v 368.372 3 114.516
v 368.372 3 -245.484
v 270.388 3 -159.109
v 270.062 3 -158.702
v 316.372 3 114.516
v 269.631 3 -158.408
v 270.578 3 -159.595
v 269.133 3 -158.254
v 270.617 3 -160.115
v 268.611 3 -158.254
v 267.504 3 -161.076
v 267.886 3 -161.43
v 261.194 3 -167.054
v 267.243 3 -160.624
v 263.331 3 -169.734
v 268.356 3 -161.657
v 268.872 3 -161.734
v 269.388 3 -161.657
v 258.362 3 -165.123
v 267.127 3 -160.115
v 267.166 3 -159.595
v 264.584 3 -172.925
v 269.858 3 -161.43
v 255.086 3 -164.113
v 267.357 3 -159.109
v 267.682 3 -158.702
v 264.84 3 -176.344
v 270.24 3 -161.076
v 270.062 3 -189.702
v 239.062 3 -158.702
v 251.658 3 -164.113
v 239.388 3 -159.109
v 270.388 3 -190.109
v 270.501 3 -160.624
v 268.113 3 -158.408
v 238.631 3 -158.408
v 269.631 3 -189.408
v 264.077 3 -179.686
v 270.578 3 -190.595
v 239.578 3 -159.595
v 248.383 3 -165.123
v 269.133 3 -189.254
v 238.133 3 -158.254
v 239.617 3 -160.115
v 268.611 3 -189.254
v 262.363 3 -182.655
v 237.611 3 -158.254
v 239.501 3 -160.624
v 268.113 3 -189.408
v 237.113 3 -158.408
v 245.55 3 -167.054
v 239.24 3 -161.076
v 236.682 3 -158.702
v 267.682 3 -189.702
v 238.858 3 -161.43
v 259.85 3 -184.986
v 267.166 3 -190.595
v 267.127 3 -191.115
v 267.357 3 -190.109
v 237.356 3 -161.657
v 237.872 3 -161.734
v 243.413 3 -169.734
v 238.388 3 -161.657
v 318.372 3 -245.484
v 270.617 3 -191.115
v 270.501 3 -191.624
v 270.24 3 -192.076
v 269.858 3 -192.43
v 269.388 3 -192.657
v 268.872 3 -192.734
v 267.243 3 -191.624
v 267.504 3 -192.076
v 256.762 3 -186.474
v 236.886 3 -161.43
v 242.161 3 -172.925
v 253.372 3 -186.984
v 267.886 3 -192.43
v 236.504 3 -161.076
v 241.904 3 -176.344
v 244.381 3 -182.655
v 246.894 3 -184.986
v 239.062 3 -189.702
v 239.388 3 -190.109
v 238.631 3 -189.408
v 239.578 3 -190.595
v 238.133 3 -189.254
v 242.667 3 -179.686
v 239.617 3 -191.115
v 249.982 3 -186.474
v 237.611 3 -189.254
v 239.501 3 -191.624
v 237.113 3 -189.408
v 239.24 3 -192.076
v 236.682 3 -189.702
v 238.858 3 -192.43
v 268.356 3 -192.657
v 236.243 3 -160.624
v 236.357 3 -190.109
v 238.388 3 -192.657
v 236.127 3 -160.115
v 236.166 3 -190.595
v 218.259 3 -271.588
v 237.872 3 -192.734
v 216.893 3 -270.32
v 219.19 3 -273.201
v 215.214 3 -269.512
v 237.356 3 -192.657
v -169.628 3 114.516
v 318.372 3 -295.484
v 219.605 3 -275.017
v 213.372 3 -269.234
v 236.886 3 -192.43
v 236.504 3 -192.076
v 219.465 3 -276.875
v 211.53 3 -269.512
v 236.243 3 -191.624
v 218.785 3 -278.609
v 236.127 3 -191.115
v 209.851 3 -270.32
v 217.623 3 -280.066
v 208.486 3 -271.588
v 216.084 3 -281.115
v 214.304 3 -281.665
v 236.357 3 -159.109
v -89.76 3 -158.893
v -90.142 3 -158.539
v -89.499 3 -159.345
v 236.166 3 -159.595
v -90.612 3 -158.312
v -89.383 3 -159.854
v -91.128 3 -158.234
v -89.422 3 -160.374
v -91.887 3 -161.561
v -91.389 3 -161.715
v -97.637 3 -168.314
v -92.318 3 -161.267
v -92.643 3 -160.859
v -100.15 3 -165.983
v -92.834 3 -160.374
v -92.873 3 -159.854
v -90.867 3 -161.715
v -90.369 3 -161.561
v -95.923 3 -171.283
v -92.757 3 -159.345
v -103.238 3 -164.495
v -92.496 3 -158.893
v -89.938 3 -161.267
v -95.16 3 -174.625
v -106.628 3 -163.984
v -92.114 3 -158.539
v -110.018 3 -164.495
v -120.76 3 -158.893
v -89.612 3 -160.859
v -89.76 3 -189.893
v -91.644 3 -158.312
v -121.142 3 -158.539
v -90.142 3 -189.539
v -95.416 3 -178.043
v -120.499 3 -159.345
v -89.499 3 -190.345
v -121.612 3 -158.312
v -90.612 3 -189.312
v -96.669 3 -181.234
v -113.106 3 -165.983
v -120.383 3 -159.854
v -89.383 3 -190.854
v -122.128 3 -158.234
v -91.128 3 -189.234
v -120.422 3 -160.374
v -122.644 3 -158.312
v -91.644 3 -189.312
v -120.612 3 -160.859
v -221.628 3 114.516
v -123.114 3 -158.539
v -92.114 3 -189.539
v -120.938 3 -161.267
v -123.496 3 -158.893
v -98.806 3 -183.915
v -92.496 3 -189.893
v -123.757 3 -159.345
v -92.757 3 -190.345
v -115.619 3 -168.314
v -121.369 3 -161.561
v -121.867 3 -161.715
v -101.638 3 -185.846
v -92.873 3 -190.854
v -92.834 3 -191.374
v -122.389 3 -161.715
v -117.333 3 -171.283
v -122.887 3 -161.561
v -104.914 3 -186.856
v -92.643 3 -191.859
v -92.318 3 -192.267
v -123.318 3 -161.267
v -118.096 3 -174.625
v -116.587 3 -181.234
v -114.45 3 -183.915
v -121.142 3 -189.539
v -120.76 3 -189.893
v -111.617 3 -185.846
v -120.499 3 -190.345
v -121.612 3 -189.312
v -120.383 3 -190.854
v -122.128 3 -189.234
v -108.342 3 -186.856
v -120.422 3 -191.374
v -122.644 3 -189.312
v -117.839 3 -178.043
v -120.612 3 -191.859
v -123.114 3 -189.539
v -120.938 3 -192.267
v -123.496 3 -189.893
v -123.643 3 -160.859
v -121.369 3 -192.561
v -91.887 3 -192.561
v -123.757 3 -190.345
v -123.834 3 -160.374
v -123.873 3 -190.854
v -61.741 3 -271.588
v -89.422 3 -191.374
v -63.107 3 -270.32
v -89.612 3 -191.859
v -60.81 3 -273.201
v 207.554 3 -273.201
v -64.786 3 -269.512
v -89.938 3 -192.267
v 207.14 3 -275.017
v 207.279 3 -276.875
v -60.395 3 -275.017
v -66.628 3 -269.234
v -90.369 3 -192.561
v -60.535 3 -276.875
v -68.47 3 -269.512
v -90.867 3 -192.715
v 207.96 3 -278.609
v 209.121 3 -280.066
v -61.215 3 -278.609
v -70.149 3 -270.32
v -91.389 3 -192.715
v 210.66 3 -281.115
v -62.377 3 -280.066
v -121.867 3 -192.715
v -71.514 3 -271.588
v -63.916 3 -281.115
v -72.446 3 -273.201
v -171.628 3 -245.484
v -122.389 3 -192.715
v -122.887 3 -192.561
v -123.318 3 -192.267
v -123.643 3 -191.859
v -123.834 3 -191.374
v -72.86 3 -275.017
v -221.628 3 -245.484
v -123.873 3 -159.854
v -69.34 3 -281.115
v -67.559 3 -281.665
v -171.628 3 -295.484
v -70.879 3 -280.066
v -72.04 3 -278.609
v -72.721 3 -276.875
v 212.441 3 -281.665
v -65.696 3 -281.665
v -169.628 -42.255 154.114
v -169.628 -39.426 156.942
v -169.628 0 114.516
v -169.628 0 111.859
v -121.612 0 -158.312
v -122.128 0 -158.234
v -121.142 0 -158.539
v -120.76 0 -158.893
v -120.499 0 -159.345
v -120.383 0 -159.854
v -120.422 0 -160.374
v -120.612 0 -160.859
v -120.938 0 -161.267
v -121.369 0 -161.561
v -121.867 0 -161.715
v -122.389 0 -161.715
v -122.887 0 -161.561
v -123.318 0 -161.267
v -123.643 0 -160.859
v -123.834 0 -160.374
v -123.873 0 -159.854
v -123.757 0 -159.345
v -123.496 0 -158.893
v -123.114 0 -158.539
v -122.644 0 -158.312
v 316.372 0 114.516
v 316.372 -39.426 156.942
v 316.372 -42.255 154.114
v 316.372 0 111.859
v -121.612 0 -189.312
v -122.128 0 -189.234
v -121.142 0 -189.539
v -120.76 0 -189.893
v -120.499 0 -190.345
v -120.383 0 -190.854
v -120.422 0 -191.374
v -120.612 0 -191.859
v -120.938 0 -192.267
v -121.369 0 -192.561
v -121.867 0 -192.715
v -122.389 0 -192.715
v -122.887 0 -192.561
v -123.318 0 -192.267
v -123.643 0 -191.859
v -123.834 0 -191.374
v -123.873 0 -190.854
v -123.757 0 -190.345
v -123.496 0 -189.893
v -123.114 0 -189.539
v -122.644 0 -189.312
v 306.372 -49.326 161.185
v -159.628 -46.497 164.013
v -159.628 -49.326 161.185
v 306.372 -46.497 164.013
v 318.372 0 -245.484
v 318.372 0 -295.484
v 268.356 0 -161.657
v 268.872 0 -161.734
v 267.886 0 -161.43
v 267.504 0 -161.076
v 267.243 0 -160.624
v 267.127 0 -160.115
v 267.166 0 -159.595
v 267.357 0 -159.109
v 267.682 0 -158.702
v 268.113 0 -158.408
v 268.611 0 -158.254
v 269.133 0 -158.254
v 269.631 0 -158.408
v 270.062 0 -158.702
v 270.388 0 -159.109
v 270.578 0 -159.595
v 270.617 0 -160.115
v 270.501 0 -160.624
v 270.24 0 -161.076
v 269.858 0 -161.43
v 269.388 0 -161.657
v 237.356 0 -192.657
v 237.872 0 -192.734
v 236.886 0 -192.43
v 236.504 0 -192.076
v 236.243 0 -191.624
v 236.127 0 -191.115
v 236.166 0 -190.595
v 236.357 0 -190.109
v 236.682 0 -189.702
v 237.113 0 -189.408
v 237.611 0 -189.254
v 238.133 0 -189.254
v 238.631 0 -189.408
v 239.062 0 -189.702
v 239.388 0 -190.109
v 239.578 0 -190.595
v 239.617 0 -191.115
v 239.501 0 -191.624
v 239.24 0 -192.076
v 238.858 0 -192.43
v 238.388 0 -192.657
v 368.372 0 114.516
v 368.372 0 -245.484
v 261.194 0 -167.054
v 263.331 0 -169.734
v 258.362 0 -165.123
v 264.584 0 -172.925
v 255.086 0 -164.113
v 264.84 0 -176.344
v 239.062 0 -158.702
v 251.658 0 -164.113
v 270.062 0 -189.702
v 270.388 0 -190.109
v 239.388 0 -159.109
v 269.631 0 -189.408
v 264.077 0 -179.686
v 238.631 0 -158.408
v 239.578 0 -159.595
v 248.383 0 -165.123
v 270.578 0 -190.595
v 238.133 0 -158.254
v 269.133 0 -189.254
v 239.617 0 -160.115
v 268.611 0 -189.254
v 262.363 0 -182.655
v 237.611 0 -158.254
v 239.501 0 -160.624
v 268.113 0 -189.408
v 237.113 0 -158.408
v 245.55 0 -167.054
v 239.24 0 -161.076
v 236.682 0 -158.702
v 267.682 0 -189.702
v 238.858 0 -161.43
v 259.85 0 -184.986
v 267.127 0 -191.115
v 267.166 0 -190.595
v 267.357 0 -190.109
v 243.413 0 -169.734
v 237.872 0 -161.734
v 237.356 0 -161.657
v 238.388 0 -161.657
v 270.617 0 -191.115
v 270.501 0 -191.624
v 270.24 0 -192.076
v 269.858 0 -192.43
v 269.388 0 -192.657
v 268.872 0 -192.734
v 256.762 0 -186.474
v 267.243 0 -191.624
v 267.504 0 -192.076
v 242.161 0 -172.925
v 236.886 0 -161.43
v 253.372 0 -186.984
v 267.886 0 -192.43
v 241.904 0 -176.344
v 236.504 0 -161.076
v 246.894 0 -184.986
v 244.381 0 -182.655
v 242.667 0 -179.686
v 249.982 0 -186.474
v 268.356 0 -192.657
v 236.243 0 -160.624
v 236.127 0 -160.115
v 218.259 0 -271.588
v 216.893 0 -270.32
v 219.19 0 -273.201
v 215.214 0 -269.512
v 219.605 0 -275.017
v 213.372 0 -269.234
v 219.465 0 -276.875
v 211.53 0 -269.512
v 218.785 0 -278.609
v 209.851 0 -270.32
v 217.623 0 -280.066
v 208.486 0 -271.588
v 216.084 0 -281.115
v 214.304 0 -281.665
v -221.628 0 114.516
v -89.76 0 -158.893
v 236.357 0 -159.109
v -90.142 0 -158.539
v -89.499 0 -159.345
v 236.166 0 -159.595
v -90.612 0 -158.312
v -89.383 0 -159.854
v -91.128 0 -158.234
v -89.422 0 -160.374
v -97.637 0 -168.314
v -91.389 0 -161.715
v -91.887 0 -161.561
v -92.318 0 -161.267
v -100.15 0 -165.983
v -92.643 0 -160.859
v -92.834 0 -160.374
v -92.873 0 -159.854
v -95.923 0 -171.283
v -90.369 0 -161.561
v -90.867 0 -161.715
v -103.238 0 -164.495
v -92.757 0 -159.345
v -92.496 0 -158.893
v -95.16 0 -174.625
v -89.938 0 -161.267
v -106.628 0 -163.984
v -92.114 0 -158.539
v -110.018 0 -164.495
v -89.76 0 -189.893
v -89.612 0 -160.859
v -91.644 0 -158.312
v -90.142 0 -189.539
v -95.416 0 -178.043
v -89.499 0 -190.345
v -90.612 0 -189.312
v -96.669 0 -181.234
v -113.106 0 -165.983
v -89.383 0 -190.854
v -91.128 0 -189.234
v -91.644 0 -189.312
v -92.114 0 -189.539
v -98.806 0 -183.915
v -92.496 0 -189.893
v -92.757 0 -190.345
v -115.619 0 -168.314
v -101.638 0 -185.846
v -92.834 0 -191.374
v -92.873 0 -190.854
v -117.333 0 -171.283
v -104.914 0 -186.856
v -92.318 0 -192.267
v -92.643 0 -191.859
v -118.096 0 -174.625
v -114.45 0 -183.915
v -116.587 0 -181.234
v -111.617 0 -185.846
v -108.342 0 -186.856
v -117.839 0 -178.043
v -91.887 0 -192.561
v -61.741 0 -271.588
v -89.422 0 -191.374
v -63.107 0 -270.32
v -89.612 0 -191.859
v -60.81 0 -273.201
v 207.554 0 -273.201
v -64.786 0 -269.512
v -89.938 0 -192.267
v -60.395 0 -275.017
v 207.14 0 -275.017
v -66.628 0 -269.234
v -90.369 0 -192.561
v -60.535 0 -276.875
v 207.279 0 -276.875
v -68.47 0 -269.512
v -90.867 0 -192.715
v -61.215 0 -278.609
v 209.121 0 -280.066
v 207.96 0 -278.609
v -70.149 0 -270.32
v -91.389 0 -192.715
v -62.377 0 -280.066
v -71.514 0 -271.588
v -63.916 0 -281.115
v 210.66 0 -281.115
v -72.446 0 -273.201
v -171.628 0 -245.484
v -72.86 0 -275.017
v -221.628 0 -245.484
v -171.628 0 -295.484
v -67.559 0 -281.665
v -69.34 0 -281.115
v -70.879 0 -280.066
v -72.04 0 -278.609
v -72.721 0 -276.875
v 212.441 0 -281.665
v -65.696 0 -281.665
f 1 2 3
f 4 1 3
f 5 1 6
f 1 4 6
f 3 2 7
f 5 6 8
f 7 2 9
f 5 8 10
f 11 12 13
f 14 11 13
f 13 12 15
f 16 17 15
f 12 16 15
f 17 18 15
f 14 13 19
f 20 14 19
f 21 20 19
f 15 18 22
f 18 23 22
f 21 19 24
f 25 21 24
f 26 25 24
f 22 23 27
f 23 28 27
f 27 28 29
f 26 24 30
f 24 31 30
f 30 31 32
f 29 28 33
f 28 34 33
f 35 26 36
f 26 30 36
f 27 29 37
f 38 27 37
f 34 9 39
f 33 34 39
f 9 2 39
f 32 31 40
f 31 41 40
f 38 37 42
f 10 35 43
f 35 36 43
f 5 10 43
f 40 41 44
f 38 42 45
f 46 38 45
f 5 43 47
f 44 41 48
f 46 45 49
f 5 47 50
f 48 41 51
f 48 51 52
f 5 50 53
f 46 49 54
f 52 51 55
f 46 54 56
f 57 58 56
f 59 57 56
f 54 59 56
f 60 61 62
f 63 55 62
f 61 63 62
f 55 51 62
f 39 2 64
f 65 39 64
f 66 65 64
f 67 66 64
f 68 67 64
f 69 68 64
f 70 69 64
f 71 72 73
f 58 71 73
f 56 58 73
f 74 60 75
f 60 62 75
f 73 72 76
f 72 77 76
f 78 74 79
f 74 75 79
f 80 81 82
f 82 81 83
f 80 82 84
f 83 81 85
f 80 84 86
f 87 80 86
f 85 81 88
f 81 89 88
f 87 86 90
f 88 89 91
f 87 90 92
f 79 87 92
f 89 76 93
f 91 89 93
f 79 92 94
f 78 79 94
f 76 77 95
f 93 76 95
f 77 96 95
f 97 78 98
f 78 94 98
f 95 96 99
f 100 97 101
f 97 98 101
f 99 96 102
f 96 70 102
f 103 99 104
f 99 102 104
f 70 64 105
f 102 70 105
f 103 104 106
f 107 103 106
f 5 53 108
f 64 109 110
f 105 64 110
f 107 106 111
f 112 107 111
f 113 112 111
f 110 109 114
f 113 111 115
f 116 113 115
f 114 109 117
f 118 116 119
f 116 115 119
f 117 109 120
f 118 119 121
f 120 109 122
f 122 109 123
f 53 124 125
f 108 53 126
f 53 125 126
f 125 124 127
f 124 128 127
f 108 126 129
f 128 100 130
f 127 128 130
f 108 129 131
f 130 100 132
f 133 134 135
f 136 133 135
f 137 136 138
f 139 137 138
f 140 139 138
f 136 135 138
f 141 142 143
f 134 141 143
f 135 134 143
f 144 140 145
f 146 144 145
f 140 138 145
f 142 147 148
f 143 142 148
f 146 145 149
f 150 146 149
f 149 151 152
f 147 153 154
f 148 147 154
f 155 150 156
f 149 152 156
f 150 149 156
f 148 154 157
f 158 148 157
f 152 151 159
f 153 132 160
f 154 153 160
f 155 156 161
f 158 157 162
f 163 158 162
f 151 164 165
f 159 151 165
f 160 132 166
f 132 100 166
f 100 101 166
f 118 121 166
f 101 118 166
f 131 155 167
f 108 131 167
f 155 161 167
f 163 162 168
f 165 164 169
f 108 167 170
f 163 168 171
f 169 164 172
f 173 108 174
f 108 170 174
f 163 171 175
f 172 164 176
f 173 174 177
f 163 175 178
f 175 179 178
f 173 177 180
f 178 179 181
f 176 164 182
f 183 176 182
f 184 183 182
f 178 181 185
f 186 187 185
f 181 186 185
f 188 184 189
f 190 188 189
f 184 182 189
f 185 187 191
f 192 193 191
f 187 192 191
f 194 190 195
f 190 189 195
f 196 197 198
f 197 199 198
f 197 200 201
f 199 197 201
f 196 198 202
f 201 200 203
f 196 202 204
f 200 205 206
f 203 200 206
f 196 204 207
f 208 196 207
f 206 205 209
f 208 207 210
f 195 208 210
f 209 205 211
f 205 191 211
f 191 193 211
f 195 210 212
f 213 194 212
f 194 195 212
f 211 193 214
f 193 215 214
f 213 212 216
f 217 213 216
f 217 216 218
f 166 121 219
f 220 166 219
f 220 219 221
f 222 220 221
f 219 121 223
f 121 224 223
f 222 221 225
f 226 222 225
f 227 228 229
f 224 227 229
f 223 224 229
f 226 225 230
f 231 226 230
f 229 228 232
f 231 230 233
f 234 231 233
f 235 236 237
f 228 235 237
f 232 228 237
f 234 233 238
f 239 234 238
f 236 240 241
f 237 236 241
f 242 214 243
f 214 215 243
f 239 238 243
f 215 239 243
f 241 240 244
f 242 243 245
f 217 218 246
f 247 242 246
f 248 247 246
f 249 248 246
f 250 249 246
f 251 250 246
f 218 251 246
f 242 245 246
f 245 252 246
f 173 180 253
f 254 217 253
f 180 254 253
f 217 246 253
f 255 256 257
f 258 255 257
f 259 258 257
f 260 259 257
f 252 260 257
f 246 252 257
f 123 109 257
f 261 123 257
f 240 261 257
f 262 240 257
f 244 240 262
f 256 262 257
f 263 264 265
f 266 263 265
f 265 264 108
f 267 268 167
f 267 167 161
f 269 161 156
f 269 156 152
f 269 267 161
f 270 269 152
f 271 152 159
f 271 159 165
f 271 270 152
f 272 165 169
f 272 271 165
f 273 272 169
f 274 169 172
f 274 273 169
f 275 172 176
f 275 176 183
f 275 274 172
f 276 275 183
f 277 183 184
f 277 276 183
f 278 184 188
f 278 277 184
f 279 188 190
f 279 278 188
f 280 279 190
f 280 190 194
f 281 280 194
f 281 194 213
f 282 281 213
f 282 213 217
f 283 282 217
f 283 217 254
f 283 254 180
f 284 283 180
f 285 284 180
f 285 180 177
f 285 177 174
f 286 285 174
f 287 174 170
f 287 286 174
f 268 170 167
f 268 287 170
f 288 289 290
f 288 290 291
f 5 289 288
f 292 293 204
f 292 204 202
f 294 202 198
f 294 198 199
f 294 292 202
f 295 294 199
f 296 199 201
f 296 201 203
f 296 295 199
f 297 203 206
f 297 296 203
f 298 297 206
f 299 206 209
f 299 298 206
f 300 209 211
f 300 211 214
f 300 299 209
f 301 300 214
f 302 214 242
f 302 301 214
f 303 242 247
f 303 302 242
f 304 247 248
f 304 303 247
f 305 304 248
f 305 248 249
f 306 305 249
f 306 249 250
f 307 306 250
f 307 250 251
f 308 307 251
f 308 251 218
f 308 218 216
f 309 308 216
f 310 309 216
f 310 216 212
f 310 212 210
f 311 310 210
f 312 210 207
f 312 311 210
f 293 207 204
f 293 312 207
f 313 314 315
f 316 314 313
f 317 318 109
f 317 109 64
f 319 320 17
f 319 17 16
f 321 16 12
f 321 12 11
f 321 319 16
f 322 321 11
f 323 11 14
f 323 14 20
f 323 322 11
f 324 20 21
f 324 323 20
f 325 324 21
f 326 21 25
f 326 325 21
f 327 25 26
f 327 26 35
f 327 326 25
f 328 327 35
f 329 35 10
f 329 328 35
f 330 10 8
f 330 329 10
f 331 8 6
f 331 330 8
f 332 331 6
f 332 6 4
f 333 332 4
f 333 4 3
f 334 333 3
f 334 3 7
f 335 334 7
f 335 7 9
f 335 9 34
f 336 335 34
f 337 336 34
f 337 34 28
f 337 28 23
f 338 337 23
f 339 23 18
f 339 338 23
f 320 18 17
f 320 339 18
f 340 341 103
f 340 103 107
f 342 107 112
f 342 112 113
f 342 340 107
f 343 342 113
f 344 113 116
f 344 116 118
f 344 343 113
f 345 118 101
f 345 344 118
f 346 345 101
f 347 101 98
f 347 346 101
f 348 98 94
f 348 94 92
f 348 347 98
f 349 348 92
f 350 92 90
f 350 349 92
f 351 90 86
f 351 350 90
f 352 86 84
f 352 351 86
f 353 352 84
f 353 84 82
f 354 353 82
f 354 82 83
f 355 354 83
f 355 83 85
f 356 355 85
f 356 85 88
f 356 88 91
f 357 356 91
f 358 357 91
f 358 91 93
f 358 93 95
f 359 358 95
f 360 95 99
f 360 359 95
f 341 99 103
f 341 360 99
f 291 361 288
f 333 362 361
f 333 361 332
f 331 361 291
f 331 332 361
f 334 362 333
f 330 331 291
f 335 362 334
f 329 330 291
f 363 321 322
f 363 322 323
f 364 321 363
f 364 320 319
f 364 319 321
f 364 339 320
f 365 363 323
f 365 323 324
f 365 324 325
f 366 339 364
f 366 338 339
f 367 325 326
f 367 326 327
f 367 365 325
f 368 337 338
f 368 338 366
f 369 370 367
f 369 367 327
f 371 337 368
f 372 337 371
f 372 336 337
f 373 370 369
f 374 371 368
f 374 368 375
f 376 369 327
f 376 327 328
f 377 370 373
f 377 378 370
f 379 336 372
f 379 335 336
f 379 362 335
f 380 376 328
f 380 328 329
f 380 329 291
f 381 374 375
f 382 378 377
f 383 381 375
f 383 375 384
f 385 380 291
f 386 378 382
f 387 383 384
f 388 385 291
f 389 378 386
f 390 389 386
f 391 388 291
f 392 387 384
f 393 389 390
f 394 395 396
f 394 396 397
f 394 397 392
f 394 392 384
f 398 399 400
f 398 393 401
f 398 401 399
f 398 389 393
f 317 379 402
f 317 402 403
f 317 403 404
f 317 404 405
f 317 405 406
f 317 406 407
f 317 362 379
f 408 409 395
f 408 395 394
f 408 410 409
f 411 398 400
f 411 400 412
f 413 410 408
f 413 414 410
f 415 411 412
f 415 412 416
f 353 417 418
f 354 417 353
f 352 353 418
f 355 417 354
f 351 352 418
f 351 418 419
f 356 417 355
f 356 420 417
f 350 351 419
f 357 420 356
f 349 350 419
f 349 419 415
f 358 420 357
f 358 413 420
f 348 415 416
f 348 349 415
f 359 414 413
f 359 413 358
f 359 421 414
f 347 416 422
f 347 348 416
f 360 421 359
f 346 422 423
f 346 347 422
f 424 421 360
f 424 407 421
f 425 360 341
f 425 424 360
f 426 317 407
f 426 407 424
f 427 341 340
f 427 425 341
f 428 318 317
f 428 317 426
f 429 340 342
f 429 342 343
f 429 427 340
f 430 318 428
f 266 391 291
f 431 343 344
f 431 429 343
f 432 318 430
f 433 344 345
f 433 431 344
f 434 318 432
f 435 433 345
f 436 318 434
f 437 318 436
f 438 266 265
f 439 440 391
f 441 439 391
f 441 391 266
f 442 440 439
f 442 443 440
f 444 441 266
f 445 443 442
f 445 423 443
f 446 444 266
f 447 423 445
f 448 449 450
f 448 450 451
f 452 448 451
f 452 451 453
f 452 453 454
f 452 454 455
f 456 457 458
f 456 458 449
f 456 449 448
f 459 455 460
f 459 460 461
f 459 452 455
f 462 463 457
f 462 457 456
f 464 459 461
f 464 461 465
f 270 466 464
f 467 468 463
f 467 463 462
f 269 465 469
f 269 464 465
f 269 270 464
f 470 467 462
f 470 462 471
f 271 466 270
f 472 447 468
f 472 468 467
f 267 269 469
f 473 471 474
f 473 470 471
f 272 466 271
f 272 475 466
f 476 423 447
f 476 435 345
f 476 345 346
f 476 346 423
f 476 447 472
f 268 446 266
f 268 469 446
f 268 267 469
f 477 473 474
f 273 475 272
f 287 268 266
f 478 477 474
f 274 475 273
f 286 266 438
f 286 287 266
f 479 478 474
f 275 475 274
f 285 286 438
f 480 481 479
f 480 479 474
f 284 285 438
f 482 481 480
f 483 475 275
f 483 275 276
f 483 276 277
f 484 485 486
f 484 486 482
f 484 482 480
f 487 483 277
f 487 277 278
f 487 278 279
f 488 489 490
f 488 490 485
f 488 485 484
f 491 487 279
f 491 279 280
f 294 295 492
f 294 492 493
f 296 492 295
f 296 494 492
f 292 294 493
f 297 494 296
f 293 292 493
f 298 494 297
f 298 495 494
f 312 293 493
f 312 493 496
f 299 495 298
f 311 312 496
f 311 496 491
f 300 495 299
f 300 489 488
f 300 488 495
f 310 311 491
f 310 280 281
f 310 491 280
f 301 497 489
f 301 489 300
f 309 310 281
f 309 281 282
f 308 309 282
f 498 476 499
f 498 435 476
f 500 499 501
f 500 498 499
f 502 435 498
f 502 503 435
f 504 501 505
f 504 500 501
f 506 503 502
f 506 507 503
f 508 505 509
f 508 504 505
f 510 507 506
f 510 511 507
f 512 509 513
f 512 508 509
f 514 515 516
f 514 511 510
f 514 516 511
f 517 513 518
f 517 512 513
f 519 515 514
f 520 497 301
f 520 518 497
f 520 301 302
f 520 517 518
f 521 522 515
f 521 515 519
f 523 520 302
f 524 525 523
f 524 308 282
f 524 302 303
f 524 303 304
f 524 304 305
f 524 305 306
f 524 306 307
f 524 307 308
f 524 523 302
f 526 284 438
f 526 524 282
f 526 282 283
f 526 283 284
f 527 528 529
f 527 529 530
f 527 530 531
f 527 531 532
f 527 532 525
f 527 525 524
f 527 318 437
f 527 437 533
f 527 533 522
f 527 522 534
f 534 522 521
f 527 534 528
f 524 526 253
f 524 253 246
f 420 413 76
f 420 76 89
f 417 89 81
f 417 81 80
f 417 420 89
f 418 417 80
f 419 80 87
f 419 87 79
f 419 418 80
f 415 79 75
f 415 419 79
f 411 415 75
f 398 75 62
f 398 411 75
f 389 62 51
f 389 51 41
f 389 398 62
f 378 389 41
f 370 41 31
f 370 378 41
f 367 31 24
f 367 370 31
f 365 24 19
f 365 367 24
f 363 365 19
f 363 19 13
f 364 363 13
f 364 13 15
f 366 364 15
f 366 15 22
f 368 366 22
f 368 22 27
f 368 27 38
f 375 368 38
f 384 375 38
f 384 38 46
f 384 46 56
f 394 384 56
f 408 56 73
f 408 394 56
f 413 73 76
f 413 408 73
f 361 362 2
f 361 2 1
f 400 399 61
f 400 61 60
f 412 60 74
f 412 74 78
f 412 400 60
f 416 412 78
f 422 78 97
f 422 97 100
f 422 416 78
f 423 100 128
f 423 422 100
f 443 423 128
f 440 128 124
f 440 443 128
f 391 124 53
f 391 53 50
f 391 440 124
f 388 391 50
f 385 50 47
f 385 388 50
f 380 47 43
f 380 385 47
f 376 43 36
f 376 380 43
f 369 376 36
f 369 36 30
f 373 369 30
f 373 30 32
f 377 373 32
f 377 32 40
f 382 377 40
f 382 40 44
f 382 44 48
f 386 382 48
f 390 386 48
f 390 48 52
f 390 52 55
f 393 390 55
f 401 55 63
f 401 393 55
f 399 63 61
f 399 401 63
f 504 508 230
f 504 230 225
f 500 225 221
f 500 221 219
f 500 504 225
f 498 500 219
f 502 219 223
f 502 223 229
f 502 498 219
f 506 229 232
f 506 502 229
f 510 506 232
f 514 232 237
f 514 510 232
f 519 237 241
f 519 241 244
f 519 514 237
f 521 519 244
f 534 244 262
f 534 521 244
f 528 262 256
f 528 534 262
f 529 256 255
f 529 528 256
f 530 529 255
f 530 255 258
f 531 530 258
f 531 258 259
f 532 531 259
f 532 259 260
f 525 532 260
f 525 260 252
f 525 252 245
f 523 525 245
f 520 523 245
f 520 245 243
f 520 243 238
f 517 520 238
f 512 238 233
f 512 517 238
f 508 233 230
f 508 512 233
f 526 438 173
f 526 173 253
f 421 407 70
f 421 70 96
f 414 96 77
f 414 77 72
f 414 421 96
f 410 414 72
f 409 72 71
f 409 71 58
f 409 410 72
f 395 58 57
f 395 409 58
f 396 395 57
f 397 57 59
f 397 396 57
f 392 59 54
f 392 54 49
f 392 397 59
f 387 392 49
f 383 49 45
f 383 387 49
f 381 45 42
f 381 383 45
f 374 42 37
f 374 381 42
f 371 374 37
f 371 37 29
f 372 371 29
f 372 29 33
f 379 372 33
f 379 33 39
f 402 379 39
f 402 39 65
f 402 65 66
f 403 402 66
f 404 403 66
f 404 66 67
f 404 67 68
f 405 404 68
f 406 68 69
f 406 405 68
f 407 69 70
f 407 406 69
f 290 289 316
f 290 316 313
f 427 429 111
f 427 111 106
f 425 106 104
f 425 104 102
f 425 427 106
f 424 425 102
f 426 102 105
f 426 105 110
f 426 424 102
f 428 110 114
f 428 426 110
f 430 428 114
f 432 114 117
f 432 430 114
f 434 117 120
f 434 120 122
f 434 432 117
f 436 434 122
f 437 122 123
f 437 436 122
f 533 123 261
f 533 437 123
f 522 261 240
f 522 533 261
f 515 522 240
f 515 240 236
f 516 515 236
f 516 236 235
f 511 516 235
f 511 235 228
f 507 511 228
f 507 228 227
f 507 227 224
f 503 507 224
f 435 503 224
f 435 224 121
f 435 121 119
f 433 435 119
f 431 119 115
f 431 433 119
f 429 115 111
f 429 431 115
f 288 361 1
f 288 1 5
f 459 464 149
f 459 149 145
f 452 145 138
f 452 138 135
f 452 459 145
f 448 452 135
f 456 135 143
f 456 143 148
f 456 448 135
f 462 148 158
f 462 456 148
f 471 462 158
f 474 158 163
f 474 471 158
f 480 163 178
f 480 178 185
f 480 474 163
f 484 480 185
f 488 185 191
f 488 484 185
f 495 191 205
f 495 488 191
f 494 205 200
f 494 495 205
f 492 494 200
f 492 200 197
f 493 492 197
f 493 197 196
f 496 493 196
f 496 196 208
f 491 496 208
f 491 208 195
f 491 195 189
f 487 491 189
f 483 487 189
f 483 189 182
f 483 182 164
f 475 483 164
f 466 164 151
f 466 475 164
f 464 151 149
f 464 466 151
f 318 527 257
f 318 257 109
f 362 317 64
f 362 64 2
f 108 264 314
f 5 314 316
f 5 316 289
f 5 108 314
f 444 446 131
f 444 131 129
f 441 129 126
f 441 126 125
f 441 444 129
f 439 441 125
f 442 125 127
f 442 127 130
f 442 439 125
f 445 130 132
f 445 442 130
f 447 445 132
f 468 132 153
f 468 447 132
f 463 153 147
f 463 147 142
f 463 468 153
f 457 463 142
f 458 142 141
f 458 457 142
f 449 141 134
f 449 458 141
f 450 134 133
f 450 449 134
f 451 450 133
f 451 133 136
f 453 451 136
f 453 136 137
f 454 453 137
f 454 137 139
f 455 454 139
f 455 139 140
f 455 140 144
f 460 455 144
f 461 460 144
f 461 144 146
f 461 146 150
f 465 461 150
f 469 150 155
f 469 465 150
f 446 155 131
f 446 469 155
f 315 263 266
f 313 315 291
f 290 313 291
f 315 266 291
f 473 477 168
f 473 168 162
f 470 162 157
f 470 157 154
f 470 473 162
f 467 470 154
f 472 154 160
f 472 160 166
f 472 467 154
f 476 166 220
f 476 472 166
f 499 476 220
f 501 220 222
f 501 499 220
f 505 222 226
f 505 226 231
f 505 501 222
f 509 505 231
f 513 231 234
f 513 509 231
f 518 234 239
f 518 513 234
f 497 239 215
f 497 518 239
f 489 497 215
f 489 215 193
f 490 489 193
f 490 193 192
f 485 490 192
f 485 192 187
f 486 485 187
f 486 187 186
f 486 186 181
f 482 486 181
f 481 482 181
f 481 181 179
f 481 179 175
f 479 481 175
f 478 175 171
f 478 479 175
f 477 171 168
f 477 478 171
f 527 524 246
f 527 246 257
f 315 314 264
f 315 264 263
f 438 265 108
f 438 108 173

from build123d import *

# Parameters (mm, degrees)
SKETCH1_R           = 11.5
SKETCH1_R_2         = 1.75
SKETCH1_R_3         = 6.25
BOSS_EXTRUDE1_DEPTH = 3
SKETCH2_W           = 486
SKETCH2_H           = 70
BOSS_EXTRUDE2_DEPTH = 4
CHAMFER1_SIZE       = 10


with BuildPart() as part:
    # Sketch1 → Boss-Extrude1 (new body)
    with BuildSketch(Plane(origin=(0, 0, 0), x_dir=(1, 0, 0), z_dir=(0, 1, 0))):
        Polygon((-221.627821886, -114.515571385), (-221.627821886, 245.484428615), (-171.627821886, 245.484428615), (-171.627821886, 295.484428615), (318.372178114, 295.484428615), (318.372178114, 245.484428615), (368.372178114, 245.484428615), (368.372178114, -114.515571385), align=None)
        with Locations(Location((-106.627821886, 175.484428615, 0), (0, 0, 270))):
            Circle(SKETCH1_R, mode=Mode.SUBTRACT)
        with Locations(Location((-122.127821886, 190.984428615, 0), (0, 0, 270))):
            Circle(SKETCH1_R_2, mode=Mode.SUBTRACT)
        with Locations(Location((-91.127821886, 190.984428615, 0), (0, 0, 270))):
            Circle(SKETCH1_R_2, mode=Mode.SUBTRACT)
        with Locations(Location((-91.127821886, 159.984428615, 0), (0, 0, 270))):
            Circle(SKETCH1_R_2, mode=Mode.SUBTRACT)
        with Locations(Location((-122.127821886, 159.984428615, 0), (0, 0, 270))):
            Circle(SKETCH1_R_2, mode=Mode.SUBTRACT)
        with Locations(Location((268.872178114, 159.984428615, 0), (0, 0, 90))):
            Circle(SKETCH1_R_2, mode=Mode.SUBTRACT)
        with Locations(Location((237.872178114, 159.984428615, 0), (0, 0, 90))):
            Circle(SKETCH1_R_2, mode=Mode.SUBTRACT)
        with Locations(Location((237.872178114, 190.984428615, 0), (0, 0, 90))):
            Circle(SKETCH1_R_2, mode=Mode.SUBTRACT)
        with Locations(Location((268.872178114, 190.984428615, 0), (0, 0, 90))):
            Circle(SKETCH1_R_2, mode=Mode.SUBTRACT)
        with Locations(Location((253.372178114, 175.484428615, 0), (0, 0, 90))):
            Circle(SKETCH1_R, mode=Mode.SUBTRACT)
        with Locations(Location((-66.627821886, 275.484428615, 0), (0, 0, 270))):
            Circle(SKETCH1_R_3, mode=Mode.SUBTRACT)
        with Locations(Location((213.372178114, 275.484428615, 0), (0, 0, 270))):
            Circle(SKETCH1_R_3, mode=Mode.SUBTRACT)
    extrude(amount=BOSS_EXTRUDE1_DEPTH)

    # Sketch2 → Boss-Extrude2 (add)
    with BuildSketch(Plane(origin=(0, 58.757785693, 58.757785693), x_dir=(1, 0, 0), z_dir=(0, 0.7071067811865464, 0.7071067811865488))):
        with Locations((73.372178114, -113.853416735)):
            Rectangle(SKETCH2_W, SKETCH2_H)
    extrude(amount=-BOSS_EXTRUDE2_DEPTH)

    # Chamfer1
    chamfer1_edges = [part.edges().sort_by_distance(p)[0] for p in [
        (-169.627821886, -47.911688245, 162.598832506),
        (316.372178114, -47.911688245, 162.598832506),
    ]]
    chamfer(chamfer1_edges, length=CHAMFER1_SIZE)


solid = part.part
